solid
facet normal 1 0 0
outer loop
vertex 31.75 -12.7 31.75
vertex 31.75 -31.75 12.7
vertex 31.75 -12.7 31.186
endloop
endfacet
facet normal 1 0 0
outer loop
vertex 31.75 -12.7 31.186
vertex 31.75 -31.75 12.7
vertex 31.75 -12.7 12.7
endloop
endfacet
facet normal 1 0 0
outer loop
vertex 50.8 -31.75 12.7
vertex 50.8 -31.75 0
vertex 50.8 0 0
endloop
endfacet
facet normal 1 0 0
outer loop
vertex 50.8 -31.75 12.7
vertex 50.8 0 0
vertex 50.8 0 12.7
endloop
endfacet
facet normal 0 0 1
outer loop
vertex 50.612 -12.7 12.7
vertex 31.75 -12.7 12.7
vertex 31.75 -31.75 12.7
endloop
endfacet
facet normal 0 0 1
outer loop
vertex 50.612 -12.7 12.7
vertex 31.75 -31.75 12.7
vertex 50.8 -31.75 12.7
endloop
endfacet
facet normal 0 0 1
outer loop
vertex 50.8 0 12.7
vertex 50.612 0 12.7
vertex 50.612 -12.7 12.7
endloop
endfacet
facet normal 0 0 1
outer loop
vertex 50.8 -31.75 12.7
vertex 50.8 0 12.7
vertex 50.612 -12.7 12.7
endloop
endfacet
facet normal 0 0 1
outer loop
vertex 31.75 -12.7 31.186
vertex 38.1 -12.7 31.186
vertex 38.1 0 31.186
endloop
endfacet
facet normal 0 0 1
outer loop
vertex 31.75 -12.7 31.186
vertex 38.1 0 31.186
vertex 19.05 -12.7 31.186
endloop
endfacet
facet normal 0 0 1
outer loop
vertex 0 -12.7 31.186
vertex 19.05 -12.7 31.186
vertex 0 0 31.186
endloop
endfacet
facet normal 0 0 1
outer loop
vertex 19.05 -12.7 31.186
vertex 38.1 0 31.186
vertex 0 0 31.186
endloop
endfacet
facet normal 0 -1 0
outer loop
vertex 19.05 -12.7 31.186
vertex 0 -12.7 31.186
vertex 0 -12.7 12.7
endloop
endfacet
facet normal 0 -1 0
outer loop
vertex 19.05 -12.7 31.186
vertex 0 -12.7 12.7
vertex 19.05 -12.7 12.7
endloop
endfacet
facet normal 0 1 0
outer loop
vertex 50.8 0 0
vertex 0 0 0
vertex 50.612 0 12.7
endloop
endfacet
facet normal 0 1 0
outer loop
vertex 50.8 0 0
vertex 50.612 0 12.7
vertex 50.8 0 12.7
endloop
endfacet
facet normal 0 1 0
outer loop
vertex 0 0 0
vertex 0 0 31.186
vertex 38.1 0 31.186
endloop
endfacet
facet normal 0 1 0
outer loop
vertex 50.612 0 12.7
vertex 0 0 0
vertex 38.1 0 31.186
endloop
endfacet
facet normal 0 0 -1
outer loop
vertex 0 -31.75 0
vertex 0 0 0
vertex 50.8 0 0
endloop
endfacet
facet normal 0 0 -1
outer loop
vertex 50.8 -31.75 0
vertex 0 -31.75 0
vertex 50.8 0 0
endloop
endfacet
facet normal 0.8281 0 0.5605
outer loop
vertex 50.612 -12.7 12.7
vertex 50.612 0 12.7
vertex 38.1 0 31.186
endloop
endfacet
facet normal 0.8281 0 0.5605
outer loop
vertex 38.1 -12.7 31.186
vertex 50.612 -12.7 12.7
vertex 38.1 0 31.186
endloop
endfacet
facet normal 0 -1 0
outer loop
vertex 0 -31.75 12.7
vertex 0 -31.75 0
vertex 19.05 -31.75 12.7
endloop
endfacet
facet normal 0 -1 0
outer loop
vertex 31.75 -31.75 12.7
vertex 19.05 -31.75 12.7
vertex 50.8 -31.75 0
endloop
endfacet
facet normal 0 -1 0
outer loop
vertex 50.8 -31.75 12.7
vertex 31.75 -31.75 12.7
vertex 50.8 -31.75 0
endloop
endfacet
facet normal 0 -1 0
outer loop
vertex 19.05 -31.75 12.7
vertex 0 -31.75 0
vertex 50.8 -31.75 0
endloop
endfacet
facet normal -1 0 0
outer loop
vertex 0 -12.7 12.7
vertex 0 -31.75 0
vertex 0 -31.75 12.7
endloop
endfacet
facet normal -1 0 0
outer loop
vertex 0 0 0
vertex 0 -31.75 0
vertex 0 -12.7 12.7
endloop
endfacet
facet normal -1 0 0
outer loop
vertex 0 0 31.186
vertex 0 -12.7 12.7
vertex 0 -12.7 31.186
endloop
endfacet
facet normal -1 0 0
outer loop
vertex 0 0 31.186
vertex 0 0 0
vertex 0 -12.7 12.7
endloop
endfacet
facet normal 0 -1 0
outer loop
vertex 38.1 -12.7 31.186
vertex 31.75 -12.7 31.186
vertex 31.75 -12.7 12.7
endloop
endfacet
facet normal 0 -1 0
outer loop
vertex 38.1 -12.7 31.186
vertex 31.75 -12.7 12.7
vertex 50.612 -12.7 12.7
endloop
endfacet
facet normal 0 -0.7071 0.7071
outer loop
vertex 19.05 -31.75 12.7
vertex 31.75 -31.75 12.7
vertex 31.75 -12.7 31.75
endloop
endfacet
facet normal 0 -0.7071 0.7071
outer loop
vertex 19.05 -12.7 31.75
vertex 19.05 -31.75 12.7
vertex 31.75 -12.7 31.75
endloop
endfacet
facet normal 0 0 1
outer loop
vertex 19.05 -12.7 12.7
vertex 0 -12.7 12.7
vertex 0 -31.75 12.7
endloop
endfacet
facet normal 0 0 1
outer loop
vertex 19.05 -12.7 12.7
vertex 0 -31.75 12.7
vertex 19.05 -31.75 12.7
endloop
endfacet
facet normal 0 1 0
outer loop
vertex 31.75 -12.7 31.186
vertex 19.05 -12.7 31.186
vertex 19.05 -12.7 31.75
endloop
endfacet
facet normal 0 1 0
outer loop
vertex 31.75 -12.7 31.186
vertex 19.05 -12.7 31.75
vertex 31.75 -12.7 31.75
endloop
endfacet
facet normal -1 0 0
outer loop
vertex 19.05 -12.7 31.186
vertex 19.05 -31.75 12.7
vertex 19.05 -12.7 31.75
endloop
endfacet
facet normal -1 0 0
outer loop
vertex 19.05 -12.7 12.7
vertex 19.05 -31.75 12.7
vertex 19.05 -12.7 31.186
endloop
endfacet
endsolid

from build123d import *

# Parameters (mm, degrees)
F0_W     = 50.8
F0_H     = 12.7
F1_DEPTH = 31.75
F3_DEPTH = 12.7
F4_W     = 12.7
F4_H     = 19.05
F5_DEPTH = 19.05
F6_DEPTH = 19.05
F8_DEPTH = 50.8


with BuildPart() as f1:
    # F0 (on Front) → F1 (new body)
    with BuildSketch(Plane.XZ):
        with Locations((25.4, 6.35)):
            Rectangle(F0_W, F0_H)
    extrude(amount=F1_DEPTH)

    # F2 (on Front) → F3 (join)
    with BuildSketch(Plane.XZ):
        Polygon((0, 12.135556), (50.79918, 12.424188), (38.1, 31.185556), (0, 31.185556), align=None)
    extrude(amount=F3_DEPTH)

    # F4 (on face) → F5 (join)
    with BuildSketch(Plane.XY.offset(12.7)):
        with Locations((25.4, -22.225)):
            Rectangle(F4_W, F4_H)
    extrude(amount=F5_DEPTH)

    # F4 (on face) → F6 (join)
    with BuildSketch(Plane.XY.offset(12.7)):
        with Locations((25.4, -22.225)):
            Rectangle(F4_W, F4_H)
    extrude(amount=F6_DEPTH)

    # F7 (on face) → F8 (cut)
    with BuildSketch(Plane.YZ.offset(31.75)):
        Polygon((-31.75, 12.7), (-12.7, 31.75), (-31.75, 31.75), align=None)
    extrude(amount=-F8_DEPTH, mode=Mode.SUBTRACT)


solid = f1.part
